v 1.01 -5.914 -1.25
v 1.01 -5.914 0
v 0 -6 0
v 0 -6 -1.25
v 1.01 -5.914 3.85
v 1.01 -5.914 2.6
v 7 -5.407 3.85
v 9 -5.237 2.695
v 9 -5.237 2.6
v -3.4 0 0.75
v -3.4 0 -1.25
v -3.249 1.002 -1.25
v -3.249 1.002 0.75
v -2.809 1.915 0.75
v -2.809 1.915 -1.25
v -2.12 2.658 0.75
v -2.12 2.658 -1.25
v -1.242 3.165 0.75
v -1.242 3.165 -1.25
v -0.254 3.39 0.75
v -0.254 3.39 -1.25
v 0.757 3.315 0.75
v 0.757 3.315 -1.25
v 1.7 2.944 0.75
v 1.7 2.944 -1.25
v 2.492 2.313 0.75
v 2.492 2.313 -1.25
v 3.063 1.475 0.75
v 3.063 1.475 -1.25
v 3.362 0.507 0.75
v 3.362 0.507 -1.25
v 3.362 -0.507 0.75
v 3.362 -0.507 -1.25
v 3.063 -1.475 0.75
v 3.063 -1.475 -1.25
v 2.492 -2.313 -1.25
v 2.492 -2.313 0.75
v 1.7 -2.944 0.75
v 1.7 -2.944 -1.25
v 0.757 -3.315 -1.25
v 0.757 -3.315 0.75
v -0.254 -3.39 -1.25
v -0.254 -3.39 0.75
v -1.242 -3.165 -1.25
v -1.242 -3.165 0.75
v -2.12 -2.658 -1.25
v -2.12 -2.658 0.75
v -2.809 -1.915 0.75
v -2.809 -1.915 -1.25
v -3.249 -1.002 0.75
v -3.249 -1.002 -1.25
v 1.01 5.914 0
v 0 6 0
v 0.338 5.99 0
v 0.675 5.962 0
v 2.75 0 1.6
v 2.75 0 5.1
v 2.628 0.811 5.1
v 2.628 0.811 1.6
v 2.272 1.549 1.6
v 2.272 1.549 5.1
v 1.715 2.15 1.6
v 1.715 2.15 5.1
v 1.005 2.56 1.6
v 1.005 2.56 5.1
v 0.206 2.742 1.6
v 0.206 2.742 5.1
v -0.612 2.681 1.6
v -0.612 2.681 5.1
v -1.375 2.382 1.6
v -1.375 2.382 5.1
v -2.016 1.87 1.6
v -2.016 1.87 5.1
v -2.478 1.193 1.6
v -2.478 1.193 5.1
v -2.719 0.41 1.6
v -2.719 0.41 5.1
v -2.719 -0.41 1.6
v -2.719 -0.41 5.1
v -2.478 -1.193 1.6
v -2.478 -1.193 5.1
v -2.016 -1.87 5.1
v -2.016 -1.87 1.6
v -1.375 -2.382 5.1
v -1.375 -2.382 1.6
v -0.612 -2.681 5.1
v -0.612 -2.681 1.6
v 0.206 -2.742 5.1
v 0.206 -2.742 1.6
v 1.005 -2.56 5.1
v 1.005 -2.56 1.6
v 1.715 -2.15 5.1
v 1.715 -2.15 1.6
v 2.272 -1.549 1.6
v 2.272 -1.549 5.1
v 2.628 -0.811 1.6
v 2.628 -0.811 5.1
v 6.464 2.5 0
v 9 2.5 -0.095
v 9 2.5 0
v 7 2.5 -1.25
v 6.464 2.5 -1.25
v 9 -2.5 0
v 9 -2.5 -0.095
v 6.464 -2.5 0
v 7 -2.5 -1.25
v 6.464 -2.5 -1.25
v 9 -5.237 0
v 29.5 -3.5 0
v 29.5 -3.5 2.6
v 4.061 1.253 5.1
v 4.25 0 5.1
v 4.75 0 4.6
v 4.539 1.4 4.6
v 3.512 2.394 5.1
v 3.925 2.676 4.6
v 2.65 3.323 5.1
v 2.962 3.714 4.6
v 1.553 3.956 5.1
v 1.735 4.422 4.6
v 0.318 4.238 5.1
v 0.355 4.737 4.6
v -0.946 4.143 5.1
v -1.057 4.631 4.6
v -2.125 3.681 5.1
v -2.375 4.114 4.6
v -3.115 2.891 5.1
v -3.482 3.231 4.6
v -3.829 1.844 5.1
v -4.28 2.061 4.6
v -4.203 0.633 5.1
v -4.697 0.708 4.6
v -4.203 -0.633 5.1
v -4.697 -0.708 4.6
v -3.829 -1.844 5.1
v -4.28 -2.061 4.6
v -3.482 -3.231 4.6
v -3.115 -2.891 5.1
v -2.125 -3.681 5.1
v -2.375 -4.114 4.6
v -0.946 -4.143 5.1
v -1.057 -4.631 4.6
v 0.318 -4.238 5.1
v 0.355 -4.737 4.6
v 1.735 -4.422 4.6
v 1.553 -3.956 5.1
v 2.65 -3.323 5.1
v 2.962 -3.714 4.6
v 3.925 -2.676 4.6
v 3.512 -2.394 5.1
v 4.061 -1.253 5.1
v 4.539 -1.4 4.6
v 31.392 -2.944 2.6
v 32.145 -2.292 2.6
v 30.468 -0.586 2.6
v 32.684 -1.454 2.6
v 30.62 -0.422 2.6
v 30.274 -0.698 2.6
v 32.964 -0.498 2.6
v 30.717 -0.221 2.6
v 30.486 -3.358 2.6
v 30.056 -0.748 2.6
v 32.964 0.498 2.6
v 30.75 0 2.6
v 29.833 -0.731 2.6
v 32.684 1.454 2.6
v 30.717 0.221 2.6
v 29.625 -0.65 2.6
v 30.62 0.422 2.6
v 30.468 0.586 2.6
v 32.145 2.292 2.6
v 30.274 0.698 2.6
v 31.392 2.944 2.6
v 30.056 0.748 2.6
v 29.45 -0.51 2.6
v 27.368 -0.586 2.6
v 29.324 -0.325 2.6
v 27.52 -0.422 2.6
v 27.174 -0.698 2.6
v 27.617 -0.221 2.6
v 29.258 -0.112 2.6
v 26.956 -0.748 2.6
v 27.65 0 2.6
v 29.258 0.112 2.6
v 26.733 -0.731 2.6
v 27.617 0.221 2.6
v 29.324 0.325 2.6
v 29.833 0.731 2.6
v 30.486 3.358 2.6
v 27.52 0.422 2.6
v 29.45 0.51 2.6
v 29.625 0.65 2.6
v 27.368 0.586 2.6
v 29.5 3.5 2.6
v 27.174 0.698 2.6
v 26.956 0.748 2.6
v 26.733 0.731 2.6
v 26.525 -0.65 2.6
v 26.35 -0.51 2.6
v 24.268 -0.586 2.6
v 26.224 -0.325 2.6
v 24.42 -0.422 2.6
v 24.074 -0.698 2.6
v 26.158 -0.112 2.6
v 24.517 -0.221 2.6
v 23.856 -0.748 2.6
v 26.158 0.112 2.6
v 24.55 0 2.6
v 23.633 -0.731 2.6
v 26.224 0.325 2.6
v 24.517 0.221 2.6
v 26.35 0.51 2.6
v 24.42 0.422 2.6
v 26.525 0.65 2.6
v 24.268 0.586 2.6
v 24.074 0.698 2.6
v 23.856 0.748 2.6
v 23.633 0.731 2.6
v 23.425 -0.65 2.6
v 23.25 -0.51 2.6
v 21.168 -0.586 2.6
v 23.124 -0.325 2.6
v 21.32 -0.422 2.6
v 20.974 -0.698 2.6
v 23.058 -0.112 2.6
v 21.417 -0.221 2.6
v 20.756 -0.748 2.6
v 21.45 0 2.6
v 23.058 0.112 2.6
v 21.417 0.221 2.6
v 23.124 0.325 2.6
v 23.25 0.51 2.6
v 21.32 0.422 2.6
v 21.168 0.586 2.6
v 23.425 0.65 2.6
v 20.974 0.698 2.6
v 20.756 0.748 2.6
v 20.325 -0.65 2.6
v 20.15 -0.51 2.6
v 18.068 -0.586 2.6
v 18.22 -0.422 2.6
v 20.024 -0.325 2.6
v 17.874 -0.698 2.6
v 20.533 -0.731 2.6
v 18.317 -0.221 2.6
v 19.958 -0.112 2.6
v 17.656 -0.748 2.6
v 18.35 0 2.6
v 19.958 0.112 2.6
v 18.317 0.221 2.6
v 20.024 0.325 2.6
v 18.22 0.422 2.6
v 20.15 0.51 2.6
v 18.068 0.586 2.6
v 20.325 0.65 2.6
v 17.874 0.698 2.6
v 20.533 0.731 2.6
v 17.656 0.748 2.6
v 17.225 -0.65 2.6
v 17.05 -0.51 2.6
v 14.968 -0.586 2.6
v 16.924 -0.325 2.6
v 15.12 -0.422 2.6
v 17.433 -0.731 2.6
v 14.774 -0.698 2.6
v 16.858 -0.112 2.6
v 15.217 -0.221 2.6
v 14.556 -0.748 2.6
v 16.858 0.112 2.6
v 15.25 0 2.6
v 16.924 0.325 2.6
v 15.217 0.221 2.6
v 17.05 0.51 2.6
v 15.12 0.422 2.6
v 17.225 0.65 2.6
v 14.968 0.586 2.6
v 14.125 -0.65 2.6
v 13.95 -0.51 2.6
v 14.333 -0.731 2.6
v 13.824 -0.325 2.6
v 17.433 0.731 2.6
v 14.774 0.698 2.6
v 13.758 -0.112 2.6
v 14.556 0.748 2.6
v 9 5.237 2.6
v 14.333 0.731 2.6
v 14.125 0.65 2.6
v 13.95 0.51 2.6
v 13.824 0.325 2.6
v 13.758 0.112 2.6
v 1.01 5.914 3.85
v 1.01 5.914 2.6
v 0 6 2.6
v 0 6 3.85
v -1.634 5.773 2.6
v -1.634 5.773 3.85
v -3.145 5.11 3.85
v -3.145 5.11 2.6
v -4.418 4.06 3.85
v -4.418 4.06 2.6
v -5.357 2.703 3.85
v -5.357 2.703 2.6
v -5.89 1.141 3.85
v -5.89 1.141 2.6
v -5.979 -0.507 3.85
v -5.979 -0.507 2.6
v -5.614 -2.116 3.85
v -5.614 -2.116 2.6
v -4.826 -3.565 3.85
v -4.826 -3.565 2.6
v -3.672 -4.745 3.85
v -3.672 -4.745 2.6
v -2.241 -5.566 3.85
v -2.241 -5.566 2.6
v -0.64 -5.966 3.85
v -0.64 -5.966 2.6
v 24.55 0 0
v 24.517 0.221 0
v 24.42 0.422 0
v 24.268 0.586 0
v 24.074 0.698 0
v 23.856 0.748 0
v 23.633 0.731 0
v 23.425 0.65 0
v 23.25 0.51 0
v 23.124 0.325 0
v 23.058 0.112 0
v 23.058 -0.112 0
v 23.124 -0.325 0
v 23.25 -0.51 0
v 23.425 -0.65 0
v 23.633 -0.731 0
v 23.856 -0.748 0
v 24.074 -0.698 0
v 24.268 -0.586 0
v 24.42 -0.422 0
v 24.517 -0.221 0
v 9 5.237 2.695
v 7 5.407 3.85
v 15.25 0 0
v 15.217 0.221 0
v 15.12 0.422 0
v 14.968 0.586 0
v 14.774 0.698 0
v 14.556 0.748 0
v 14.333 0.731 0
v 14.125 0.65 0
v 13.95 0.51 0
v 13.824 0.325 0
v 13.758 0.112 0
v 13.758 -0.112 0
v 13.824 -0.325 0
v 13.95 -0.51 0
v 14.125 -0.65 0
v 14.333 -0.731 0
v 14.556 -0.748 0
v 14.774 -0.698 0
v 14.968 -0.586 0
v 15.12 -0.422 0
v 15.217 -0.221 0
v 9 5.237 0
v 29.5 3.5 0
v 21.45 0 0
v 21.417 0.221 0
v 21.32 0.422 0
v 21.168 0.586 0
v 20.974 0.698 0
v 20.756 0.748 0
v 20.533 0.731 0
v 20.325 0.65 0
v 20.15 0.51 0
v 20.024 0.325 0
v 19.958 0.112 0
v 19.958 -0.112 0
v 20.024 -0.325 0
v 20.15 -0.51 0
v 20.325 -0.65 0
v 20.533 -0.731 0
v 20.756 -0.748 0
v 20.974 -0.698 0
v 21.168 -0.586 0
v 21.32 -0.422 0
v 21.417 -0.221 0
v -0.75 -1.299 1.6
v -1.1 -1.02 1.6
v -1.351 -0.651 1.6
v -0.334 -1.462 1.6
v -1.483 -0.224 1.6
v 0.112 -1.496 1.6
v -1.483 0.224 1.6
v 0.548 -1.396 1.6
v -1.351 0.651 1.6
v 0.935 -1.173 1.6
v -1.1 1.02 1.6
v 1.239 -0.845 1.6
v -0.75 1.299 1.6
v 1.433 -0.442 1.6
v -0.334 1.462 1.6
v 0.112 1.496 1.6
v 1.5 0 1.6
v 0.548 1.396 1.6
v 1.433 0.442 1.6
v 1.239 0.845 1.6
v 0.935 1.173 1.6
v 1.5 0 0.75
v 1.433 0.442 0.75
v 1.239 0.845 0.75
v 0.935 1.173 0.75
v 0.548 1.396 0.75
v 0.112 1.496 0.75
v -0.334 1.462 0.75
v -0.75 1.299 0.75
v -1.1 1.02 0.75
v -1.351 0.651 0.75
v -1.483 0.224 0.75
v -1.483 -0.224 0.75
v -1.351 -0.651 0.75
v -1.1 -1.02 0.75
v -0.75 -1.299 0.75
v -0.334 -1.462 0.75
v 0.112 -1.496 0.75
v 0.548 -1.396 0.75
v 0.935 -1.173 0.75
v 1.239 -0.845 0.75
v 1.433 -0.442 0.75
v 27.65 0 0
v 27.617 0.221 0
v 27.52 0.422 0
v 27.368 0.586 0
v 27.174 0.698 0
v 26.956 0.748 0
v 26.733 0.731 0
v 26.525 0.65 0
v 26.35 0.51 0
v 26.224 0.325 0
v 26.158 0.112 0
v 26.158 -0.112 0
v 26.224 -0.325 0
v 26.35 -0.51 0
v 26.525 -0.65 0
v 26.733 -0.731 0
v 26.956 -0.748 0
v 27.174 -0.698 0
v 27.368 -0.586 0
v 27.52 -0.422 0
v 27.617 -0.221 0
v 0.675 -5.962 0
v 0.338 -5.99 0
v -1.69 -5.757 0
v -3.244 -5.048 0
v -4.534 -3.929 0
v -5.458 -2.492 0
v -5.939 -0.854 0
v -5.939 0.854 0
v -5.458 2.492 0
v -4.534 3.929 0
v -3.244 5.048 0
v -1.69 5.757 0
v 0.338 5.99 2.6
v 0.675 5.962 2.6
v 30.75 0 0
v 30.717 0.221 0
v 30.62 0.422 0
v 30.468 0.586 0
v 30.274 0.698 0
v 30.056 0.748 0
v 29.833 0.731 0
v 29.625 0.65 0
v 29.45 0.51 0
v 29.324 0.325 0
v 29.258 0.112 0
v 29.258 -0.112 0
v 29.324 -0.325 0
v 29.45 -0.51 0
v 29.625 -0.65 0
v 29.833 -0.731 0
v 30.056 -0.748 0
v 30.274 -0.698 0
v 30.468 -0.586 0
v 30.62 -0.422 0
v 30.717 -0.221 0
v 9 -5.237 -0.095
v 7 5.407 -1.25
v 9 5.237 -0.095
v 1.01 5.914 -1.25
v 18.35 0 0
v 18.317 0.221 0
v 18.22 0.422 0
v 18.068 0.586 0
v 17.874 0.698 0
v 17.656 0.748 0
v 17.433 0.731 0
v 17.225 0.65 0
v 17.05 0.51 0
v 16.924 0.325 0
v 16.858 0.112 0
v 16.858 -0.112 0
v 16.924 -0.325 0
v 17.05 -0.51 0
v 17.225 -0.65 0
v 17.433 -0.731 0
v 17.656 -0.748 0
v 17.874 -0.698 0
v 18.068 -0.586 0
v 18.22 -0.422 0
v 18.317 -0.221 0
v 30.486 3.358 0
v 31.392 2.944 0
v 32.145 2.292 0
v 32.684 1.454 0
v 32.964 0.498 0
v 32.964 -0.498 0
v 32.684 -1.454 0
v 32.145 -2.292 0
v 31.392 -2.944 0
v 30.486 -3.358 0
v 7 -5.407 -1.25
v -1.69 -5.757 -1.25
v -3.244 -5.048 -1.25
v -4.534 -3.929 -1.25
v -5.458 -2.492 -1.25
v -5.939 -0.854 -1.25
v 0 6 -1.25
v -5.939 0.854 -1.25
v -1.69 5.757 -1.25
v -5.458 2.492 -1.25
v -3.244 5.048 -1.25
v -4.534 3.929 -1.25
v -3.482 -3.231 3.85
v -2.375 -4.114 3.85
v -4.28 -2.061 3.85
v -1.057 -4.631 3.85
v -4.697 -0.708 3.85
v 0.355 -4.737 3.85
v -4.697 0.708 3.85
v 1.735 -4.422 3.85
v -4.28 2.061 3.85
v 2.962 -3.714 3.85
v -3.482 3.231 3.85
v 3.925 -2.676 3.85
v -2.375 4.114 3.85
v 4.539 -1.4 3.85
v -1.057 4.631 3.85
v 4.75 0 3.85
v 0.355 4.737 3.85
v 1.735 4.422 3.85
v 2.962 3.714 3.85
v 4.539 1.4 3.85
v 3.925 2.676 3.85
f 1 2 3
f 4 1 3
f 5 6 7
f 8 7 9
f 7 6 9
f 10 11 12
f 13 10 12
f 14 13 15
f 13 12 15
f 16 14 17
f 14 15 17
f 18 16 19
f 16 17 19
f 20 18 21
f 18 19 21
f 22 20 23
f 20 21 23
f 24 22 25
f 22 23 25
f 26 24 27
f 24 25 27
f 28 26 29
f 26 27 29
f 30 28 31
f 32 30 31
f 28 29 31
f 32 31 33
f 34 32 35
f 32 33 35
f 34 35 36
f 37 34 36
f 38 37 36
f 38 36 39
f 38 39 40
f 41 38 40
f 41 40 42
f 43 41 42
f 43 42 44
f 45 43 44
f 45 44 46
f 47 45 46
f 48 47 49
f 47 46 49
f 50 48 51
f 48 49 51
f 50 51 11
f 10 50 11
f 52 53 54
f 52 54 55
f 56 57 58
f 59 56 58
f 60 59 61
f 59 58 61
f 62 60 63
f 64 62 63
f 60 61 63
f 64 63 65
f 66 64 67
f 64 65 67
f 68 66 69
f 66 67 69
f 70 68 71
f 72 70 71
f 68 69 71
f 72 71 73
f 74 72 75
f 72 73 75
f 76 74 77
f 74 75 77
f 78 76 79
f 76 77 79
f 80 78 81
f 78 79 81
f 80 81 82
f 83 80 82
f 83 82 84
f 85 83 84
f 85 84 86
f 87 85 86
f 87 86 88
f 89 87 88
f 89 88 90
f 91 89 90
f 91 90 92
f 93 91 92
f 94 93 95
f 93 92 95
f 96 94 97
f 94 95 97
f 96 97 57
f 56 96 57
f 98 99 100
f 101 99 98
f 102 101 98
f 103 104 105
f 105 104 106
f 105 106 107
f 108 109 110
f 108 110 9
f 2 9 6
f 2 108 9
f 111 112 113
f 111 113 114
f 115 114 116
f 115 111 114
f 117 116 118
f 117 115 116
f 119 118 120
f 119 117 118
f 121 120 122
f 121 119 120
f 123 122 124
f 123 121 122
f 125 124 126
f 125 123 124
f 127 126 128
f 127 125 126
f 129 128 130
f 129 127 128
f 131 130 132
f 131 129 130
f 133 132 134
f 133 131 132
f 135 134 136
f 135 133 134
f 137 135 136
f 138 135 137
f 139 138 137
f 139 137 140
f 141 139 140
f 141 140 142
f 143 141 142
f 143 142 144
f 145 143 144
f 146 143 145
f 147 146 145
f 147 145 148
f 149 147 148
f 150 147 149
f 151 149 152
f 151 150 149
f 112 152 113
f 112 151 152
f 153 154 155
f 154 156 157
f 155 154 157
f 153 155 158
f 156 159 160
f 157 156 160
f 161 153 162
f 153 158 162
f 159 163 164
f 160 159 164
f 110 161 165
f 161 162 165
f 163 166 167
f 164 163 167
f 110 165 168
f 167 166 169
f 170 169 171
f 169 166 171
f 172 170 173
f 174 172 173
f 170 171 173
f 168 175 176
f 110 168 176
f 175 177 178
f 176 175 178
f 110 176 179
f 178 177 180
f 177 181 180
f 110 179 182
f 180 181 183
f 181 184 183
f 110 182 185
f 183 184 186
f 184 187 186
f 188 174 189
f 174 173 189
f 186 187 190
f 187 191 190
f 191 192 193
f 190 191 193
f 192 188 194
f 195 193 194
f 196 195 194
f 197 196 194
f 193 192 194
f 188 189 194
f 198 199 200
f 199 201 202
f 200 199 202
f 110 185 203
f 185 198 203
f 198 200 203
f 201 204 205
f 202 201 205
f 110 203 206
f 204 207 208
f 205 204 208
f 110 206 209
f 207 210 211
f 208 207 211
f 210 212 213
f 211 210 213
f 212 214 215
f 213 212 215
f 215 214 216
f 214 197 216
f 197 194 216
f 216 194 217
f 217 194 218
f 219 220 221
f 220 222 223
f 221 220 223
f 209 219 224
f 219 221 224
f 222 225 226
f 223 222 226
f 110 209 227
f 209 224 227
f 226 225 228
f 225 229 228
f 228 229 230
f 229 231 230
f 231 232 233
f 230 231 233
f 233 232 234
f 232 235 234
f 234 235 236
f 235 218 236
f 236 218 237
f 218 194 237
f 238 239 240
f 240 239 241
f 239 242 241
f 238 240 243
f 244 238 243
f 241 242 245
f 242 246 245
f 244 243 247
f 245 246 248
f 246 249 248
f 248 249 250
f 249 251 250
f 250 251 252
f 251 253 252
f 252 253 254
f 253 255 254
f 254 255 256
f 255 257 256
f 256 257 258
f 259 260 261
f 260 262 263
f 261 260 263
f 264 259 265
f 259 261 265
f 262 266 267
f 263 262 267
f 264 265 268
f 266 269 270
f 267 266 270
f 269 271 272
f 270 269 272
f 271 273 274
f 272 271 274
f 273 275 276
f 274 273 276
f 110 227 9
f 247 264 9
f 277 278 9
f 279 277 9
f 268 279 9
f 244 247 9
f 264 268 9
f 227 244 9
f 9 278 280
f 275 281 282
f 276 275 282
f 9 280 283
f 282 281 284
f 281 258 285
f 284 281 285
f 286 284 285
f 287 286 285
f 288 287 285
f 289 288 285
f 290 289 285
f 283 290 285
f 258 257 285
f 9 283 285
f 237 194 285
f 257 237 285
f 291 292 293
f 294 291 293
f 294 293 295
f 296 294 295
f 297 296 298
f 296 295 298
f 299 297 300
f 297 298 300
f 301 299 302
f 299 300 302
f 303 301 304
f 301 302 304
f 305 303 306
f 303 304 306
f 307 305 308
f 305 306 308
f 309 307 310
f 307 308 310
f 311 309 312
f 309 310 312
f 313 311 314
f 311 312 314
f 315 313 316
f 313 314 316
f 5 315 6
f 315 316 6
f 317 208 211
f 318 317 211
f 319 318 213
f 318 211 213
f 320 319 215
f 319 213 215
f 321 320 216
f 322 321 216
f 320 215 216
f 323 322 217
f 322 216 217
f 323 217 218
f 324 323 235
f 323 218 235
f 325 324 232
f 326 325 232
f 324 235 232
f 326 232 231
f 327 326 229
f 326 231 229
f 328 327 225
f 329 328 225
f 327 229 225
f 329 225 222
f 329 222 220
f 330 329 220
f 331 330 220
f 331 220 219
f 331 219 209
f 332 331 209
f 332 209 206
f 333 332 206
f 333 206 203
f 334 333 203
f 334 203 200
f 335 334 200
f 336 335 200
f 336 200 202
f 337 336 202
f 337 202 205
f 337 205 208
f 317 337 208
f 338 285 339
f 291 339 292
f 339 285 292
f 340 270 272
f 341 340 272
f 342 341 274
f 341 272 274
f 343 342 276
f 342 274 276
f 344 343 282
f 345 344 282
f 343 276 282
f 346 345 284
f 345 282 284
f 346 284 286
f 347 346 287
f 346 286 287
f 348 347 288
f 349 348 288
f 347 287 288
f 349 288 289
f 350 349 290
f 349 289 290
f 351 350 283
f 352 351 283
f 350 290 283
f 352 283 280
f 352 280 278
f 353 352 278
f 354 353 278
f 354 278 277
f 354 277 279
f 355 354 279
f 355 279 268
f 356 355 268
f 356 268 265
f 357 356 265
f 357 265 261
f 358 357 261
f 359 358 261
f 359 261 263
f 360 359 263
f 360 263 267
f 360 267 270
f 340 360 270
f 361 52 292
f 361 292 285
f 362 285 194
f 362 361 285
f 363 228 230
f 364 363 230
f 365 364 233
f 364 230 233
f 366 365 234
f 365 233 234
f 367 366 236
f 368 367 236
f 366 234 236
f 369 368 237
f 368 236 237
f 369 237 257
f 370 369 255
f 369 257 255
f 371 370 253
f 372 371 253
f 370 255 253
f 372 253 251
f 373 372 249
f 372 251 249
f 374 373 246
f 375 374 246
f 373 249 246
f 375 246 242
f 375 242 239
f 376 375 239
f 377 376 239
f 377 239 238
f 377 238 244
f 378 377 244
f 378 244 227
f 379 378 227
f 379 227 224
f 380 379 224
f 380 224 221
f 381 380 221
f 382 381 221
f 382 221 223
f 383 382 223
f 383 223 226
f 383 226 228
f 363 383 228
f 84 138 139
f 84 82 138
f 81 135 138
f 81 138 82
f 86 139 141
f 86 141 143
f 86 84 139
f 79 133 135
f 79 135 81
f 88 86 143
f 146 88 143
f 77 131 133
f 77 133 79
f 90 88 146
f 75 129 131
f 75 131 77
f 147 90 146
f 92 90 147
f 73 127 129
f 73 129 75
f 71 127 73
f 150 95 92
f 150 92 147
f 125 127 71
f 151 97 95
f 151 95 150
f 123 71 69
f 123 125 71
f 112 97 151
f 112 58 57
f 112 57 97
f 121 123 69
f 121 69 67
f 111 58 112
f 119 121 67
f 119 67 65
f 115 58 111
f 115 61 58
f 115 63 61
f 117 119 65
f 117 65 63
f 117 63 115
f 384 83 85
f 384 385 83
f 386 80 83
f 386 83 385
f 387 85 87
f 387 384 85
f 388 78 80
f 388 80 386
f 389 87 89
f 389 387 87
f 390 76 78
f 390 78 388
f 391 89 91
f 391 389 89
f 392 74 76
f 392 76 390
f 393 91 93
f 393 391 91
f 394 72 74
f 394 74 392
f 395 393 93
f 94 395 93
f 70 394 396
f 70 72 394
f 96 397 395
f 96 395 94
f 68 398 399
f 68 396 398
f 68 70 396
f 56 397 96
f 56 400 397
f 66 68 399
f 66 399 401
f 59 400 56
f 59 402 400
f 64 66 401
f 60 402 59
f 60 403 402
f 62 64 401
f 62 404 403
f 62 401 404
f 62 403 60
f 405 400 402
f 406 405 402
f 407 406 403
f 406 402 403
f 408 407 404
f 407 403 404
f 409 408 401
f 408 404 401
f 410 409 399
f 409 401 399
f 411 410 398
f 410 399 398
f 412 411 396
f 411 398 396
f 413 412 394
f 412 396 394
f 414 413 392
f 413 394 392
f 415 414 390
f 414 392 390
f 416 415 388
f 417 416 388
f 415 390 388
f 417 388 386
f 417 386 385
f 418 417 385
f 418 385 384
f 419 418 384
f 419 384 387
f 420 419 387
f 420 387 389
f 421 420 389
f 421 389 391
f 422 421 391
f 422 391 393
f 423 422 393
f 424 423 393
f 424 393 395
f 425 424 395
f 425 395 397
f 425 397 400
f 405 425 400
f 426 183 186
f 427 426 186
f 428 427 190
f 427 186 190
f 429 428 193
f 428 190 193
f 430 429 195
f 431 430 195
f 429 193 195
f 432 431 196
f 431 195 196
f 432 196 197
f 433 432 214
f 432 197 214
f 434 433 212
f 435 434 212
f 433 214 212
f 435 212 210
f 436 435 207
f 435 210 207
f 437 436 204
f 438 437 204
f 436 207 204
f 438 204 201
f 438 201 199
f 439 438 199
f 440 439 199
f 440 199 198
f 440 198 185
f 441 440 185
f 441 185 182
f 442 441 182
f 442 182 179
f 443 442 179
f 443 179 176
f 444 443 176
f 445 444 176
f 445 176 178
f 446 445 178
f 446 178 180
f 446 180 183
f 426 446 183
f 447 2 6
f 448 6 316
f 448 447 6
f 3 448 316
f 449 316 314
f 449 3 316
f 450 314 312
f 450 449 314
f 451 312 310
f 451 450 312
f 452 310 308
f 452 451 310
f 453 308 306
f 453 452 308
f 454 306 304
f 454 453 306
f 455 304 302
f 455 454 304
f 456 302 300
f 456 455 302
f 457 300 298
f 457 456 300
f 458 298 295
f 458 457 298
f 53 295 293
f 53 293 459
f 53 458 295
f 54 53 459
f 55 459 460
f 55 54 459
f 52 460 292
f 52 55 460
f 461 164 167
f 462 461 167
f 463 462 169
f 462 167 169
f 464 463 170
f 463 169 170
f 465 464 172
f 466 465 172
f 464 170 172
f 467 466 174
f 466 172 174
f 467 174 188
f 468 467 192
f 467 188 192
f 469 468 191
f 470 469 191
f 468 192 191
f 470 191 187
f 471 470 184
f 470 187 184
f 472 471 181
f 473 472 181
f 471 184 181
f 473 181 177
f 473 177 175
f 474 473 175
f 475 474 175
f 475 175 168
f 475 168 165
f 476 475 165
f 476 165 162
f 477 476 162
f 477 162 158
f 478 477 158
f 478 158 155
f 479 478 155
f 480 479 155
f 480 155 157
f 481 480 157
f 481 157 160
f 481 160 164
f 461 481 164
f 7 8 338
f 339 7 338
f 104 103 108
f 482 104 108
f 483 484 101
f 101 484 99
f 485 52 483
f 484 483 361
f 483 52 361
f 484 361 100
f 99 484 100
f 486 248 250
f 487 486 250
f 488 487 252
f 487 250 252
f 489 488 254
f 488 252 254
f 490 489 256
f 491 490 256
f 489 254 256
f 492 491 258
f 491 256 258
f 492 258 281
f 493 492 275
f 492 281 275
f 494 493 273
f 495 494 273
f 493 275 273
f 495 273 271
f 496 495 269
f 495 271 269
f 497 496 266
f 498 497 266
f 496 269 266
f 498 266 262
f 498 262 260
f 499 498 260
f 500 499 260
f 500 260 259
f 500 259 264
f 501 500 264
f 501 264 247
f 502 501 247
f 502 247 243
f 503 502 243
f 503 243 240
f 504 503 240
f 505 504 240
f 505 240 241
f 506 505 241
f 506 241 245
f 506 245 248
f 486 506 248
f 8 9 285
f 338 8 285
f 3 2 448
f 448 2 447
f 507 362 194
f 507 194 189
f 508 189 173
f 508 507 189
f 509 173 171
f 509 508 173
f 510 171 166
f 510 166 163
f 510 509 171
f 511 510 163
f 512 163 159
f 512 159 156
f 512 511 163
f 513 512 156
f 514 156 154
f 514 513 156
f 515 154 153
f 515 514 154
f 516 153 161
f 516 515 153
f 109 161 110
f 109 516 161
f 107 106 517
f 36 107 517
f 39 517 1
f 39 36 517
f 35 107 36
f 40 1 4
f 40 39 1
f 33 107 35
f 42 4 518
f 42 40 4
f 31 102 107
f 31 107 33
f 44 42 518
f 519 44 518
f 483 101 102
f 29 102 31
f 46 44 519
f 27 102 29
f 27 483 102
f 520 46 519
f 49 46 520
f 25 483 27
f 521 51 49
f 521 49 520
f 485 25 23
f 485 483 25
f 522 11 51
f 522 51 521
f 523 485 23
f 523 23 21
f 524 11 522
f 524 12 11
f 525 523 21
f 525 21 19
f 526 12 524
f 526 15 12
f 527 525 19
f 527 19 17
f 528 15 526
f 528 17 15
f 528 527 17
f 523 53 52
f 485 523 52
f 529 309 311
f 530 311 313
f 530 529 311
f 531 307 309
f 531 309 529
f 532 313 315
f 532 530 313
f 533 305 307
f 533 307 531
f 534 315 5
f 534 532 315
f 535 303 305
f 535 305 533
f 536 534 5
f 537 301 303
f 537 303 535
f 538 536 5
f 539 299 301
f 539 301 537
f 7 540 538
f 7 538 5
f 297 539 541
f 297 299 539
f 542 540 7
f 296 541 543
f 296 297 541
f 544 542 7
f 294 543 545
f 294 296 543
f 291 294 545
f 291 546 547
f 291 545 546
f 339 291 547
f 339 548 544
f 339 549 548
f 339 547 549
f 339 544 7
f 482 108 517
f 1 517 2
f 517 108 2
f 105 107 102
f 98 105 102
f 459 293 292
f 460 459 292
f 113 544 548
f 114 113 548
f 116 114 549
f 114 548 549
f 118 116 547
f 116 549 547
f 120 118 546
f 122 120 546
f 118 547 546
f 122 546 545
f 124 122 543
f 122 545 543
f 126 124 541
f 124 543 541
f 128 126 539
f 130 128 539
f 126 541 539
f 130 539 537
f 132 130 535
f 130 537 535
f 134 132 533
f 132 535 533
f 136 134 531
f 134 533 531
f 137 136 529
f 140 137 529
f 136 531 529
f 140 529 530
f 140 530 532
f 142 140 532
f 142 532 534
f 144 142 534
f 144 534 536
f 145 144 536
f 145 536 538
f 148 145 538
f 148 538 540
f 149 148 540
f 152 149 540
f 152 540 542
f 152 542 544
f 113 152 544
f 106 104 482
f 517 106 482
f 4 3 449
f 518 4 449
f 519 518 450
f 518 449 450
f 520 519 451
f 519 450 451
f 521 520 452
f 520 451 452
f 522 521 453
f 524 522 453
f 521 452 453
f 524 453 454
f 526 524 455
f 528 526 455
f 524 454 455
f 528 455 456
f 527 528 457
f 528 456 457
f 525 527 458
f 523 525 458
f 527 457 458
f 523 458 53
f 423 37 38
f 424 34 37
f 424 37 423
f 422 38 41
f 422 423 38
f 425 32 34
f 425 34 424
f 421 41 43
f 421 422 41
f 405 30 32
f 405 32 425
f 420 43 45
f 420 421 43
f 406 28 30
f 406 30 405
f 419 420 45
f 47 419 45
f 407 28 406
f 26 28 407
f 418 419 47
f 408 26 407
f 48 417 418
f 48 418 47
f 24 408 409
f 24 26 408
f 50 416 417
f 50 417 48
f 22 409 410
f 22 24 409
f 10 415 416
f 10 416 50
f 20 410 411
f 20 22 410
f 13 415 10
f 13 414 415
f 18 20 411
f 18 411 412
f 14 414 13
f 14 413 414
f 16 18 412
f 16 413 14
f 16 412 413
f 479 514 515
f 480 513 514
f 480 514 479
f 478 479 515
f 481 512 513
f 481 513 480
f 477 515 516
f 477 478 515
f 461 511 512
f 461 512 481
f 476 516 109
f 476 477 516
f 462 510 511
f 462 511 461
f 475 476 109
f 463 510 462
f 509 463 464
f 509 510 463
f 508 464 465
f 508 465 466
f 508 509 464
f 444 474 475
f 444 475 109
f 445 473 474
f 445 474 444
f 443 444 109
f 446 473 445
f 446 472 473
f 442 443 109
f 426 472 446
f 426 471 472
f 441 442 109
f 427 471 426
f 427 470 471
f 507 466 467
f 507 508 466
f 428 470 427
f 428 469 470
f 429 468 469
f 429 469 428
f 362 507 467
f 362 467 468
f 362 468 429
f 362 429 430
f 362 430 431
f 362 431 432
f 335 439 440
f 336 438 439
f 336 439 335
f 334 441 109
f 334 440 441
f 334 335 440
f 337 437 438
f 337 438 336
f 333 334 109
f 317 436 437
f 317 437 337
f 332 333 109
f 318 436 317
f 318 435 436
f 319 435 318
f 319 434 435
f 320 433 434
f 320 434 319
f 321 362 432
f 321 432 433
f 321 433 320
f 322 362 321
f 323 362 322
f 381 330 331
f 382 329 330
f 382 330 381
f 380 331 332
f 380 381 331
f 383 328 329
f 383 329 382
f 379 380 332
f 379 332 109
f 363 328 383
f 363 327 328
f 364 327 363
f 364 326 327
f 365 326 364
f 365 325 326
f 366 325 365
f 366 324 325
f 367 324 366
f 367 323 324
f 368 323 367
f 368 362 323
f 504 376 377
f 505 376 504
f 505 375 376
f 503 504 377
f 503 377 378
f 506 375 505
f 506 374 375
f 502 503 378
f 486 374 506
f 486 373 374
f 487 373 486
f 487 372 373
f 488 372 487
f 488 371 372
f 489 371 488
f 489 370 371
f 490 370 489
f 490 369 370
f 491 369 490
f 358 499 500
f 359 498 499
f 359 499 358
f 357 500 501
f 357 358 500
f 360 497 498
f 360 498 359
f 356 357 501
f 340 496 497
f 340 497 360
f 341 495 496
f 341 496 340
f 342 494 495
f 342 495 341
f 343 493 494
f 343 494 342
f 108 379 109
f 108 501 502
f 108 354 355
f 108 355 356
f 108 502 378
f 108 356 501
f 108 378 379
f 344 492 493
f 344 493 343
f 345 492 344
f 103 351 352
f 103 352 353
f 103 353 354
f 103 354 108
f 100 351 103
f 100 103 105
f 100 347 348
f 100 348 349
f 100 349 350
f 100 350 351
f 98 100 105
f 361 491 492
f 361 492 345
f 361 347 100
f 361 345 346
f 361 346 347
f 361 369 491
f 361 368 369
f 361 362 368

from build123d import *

# Parameters (mm, degrees)
BOSS_EXTRUDE1_DEPTH = 2.6
SKETCH2_R           = 4.75
BOSS_EXTRUDE2_DEPTH = 2.5
SKETCH3_R           = 2.5
CUT_EXTRUDE1_DEPTH  = 4
SKETCH4_R           = 0.75
CUT_EXTRUDE2_DEPTH  = 4
SKETCH5_R           = 4.75
BOSS_EXTRUDE3_DEPTH = 1.25
CHAMFER1_SIZE       = 2
CHAMFER1_SIZE2      = 1.154700538
BOSS_EXTRUDE4_DEPTH = 1.25
CHAMFER2_SIZE       = 2
CHAMFER2_SIZE2      = 1.154700538
SKETCH7_W           = 3
SKETCH7_H           = 5
CUT_EXTRUDE3_DEPTH  = 1.25
SKETCH8_R           = 2.75
CUT_EXTRUDE4_DEPTH  = 3.5
SKETCH9_R           = 3.4
CUT_EXTRUDE5_DEPTH  = 2
CHAMFER3_SIZE       = 0.5
SKETCH10_R          = 1.5
CUT_EXTRUDE6_DEPTH  = 5


with BuildPart() as part:
    # Sketch1 → Boss-Extrude1 (new body)
    with BuildSketch(Plane.XY):
        with BuildLine():
            Line((1.009697661, 5.914432402), (29.5, 3.5))
            ThreePointArc((29.5, 3.5), (33, 0), (29.5, -3.5))
            Line((29.5, -3.5), (1.009697661, -5.914432402))
            ThreePointArc((1.009697661, -5.914432402), (-6, 0), (1.009697661, 5.914432402))
        make_face()
    extrude(amount=BOSS_EXTRUDE1_DEPTH)

    # Sketch2 → Boss-Extrude2 (add)
    with BuildSketch(Plane.XY.offset(2.6)):
        Circle(SKETCH2_R)
    extrude(amount=BOSS_EXTRUDE2_DEPTH)

    # Sketch3 → Cut-Extrude1 (cut)
    with BuildSketch(Plane.XY.offset(2.6)):
        Circle(SKETCH3_R)
    extrude(amount=CUT_EXTRUDE1_DEPTH, mode=Mode.SUBTRACT)

    # Sketch4 → Cut-Extrude2 (cut)
    with BuildSketch(Plane.XY.offset(2.6)):
        with Locations((30, 0)):
            Circle(SKETCH4_R)
        with Locations((26.9, 0)):
            Circle(SKETCH4_R)
        with Locations((23.8, 0)):
            Circle(SKETCH4_R)
        with Locations((20.7, 0)):
            Circle(SKETCH4_R)
        with Locations((17.6, 0)):
            Circle(SKETCH4_R)
        with Locations((14.5, 0)):
            Circle(SKETCH4_R)
    extrude(amount=-CUT_EXTRUDE2_DEPTH, mode=Mode.SUBTRACT)

    # Sketch5 → Boss-Extrude3 (add)
    with BuildSketch(Plane.XY.offset(2.6)):
        with BuildLine():
            Line((1.009697661, 5.914432402), (0, 6))
            ThreePointArc((0, 6), (-5.978569829, -0.50665846), (1.009697661, -5.914432402))
            Line((1.009697661, -5.914432402), (9, -5.237288136))
            Line((9, -5.237288136), (9, 5.237288136))
            Line((9, 5.237288136), (1.009697661, 5.914432402))
        make_face()
        Circle(SKETCH5_R, mode=Mode.SUBTRACT)
    extrude(amount=BOSS_EXTRUDE3_DEPTH)

    # Chamfer1
    chamfer1_edges = [part.edges().sort_by_distance(p)[0] for p in [
        (9, 0, 3.85),
    ]]
    chamfer1_side = [part.faces().sort_by_distance(p)[0] for p in [
        (4.988627845, -5.384452642, 3.85),
    ]]
    chamfer(chamfer1_edges, length=CHAMFER1_SIZE, length2=CHAMFER1_SIZE2, reference=chamfer1_side[0])

    # Sketch6 → Boss-Extrude4 (add)
    with BuildSketch(Plane(origin=(0, 0, 0), x_dir=(-1, 0, 0), z_dir=(0, 0, -1))):
        with BuildLine():
            Line((-1.009697661, -5.914432402), (0, -6))
            ThreePointArc((0, -6), (6, 0), (0, 6))
            Line((0, 6), (-1.009697661, 5.914432402))
            Line((-1.009697661, 5.914432402), (-9, 5.237288136))
            Line((-9, 5.237288136), (-9, -5.237288136))
            Line((-9, -5.237288136), (-1.009697661, -5.914432402))
        make_face()
    extrude(amount=BOSS_EXTRUDE4_DEPTH)

    # Chamfer2
    chamfer2_edges = [part.edges().sort_by_distance(p)[0] for p in [
        (9, 0, -1.25),
    ]]
    chamfer2_side = [part.faces().sort_by_distance(p)[0] for p in [
        (1.907695527, 0, -1.25),
    ]]
    chamfer(chamfer2_edges, length=CHAMFER2_SIZE, length2=CHAMFER2_SIZE2, reference=chamfer2_side[0])

    # Sketch7 → Cut-Extrude3 (cut)
    with BuildSketch(Plane(origin=(0, 0, -1.25), x_dir=(-1, 0, 0), z_dir=(0, 0, -1))):
        with Locations((-7.964462138, 0)):
            Rectangle(SKETCH7_W, SKETCH7_H)
    extrude(amount=-CUT_EXTRUDE3_DEPTH, mode=Mode.SUBTRACT)

    # Sketch8 → Cut-Extrude4 (cut)
    with BuildSketch(Plane.XY.offset(5.1)):
        Circle(SKETCH8_R)
    extrude(amount=-CUT_EXTRUDE4_DEPTH, mode=Mode.SUBTRACT)

    # Sketch9 → Cut-Extrude5 (cut)
    with BuildSketch(Plane(origin=(0, 0, -1.25), x_dir=(-1, 0, 0), z_dir=(0, 0, -1))):
        Circle(SKETCH9_R)
    extrude(amount=-CUT_EXTRUDE5_DEPTH, mode=Mode.SUBTRACT)

    # Chamfer3
    chamfer3_edges = [part.edges().sort_by_distance(p)[0] for p in [
        (-4.75, 0, 5.1),
    ]]
    chamfer(chamfer3_edges, length=CHAMFER3_SIZE)

    # Sketch10 → Cut-Extrude6 (cut)
    with BuildSketch(Plane.XY.offset(1.6)):
        Circle(SKETCH10_R)
    extrude(amount=-CUT_EXTRUDE6_DEPTH, mode=Mode.SUBTRACT)


solid = part.part
